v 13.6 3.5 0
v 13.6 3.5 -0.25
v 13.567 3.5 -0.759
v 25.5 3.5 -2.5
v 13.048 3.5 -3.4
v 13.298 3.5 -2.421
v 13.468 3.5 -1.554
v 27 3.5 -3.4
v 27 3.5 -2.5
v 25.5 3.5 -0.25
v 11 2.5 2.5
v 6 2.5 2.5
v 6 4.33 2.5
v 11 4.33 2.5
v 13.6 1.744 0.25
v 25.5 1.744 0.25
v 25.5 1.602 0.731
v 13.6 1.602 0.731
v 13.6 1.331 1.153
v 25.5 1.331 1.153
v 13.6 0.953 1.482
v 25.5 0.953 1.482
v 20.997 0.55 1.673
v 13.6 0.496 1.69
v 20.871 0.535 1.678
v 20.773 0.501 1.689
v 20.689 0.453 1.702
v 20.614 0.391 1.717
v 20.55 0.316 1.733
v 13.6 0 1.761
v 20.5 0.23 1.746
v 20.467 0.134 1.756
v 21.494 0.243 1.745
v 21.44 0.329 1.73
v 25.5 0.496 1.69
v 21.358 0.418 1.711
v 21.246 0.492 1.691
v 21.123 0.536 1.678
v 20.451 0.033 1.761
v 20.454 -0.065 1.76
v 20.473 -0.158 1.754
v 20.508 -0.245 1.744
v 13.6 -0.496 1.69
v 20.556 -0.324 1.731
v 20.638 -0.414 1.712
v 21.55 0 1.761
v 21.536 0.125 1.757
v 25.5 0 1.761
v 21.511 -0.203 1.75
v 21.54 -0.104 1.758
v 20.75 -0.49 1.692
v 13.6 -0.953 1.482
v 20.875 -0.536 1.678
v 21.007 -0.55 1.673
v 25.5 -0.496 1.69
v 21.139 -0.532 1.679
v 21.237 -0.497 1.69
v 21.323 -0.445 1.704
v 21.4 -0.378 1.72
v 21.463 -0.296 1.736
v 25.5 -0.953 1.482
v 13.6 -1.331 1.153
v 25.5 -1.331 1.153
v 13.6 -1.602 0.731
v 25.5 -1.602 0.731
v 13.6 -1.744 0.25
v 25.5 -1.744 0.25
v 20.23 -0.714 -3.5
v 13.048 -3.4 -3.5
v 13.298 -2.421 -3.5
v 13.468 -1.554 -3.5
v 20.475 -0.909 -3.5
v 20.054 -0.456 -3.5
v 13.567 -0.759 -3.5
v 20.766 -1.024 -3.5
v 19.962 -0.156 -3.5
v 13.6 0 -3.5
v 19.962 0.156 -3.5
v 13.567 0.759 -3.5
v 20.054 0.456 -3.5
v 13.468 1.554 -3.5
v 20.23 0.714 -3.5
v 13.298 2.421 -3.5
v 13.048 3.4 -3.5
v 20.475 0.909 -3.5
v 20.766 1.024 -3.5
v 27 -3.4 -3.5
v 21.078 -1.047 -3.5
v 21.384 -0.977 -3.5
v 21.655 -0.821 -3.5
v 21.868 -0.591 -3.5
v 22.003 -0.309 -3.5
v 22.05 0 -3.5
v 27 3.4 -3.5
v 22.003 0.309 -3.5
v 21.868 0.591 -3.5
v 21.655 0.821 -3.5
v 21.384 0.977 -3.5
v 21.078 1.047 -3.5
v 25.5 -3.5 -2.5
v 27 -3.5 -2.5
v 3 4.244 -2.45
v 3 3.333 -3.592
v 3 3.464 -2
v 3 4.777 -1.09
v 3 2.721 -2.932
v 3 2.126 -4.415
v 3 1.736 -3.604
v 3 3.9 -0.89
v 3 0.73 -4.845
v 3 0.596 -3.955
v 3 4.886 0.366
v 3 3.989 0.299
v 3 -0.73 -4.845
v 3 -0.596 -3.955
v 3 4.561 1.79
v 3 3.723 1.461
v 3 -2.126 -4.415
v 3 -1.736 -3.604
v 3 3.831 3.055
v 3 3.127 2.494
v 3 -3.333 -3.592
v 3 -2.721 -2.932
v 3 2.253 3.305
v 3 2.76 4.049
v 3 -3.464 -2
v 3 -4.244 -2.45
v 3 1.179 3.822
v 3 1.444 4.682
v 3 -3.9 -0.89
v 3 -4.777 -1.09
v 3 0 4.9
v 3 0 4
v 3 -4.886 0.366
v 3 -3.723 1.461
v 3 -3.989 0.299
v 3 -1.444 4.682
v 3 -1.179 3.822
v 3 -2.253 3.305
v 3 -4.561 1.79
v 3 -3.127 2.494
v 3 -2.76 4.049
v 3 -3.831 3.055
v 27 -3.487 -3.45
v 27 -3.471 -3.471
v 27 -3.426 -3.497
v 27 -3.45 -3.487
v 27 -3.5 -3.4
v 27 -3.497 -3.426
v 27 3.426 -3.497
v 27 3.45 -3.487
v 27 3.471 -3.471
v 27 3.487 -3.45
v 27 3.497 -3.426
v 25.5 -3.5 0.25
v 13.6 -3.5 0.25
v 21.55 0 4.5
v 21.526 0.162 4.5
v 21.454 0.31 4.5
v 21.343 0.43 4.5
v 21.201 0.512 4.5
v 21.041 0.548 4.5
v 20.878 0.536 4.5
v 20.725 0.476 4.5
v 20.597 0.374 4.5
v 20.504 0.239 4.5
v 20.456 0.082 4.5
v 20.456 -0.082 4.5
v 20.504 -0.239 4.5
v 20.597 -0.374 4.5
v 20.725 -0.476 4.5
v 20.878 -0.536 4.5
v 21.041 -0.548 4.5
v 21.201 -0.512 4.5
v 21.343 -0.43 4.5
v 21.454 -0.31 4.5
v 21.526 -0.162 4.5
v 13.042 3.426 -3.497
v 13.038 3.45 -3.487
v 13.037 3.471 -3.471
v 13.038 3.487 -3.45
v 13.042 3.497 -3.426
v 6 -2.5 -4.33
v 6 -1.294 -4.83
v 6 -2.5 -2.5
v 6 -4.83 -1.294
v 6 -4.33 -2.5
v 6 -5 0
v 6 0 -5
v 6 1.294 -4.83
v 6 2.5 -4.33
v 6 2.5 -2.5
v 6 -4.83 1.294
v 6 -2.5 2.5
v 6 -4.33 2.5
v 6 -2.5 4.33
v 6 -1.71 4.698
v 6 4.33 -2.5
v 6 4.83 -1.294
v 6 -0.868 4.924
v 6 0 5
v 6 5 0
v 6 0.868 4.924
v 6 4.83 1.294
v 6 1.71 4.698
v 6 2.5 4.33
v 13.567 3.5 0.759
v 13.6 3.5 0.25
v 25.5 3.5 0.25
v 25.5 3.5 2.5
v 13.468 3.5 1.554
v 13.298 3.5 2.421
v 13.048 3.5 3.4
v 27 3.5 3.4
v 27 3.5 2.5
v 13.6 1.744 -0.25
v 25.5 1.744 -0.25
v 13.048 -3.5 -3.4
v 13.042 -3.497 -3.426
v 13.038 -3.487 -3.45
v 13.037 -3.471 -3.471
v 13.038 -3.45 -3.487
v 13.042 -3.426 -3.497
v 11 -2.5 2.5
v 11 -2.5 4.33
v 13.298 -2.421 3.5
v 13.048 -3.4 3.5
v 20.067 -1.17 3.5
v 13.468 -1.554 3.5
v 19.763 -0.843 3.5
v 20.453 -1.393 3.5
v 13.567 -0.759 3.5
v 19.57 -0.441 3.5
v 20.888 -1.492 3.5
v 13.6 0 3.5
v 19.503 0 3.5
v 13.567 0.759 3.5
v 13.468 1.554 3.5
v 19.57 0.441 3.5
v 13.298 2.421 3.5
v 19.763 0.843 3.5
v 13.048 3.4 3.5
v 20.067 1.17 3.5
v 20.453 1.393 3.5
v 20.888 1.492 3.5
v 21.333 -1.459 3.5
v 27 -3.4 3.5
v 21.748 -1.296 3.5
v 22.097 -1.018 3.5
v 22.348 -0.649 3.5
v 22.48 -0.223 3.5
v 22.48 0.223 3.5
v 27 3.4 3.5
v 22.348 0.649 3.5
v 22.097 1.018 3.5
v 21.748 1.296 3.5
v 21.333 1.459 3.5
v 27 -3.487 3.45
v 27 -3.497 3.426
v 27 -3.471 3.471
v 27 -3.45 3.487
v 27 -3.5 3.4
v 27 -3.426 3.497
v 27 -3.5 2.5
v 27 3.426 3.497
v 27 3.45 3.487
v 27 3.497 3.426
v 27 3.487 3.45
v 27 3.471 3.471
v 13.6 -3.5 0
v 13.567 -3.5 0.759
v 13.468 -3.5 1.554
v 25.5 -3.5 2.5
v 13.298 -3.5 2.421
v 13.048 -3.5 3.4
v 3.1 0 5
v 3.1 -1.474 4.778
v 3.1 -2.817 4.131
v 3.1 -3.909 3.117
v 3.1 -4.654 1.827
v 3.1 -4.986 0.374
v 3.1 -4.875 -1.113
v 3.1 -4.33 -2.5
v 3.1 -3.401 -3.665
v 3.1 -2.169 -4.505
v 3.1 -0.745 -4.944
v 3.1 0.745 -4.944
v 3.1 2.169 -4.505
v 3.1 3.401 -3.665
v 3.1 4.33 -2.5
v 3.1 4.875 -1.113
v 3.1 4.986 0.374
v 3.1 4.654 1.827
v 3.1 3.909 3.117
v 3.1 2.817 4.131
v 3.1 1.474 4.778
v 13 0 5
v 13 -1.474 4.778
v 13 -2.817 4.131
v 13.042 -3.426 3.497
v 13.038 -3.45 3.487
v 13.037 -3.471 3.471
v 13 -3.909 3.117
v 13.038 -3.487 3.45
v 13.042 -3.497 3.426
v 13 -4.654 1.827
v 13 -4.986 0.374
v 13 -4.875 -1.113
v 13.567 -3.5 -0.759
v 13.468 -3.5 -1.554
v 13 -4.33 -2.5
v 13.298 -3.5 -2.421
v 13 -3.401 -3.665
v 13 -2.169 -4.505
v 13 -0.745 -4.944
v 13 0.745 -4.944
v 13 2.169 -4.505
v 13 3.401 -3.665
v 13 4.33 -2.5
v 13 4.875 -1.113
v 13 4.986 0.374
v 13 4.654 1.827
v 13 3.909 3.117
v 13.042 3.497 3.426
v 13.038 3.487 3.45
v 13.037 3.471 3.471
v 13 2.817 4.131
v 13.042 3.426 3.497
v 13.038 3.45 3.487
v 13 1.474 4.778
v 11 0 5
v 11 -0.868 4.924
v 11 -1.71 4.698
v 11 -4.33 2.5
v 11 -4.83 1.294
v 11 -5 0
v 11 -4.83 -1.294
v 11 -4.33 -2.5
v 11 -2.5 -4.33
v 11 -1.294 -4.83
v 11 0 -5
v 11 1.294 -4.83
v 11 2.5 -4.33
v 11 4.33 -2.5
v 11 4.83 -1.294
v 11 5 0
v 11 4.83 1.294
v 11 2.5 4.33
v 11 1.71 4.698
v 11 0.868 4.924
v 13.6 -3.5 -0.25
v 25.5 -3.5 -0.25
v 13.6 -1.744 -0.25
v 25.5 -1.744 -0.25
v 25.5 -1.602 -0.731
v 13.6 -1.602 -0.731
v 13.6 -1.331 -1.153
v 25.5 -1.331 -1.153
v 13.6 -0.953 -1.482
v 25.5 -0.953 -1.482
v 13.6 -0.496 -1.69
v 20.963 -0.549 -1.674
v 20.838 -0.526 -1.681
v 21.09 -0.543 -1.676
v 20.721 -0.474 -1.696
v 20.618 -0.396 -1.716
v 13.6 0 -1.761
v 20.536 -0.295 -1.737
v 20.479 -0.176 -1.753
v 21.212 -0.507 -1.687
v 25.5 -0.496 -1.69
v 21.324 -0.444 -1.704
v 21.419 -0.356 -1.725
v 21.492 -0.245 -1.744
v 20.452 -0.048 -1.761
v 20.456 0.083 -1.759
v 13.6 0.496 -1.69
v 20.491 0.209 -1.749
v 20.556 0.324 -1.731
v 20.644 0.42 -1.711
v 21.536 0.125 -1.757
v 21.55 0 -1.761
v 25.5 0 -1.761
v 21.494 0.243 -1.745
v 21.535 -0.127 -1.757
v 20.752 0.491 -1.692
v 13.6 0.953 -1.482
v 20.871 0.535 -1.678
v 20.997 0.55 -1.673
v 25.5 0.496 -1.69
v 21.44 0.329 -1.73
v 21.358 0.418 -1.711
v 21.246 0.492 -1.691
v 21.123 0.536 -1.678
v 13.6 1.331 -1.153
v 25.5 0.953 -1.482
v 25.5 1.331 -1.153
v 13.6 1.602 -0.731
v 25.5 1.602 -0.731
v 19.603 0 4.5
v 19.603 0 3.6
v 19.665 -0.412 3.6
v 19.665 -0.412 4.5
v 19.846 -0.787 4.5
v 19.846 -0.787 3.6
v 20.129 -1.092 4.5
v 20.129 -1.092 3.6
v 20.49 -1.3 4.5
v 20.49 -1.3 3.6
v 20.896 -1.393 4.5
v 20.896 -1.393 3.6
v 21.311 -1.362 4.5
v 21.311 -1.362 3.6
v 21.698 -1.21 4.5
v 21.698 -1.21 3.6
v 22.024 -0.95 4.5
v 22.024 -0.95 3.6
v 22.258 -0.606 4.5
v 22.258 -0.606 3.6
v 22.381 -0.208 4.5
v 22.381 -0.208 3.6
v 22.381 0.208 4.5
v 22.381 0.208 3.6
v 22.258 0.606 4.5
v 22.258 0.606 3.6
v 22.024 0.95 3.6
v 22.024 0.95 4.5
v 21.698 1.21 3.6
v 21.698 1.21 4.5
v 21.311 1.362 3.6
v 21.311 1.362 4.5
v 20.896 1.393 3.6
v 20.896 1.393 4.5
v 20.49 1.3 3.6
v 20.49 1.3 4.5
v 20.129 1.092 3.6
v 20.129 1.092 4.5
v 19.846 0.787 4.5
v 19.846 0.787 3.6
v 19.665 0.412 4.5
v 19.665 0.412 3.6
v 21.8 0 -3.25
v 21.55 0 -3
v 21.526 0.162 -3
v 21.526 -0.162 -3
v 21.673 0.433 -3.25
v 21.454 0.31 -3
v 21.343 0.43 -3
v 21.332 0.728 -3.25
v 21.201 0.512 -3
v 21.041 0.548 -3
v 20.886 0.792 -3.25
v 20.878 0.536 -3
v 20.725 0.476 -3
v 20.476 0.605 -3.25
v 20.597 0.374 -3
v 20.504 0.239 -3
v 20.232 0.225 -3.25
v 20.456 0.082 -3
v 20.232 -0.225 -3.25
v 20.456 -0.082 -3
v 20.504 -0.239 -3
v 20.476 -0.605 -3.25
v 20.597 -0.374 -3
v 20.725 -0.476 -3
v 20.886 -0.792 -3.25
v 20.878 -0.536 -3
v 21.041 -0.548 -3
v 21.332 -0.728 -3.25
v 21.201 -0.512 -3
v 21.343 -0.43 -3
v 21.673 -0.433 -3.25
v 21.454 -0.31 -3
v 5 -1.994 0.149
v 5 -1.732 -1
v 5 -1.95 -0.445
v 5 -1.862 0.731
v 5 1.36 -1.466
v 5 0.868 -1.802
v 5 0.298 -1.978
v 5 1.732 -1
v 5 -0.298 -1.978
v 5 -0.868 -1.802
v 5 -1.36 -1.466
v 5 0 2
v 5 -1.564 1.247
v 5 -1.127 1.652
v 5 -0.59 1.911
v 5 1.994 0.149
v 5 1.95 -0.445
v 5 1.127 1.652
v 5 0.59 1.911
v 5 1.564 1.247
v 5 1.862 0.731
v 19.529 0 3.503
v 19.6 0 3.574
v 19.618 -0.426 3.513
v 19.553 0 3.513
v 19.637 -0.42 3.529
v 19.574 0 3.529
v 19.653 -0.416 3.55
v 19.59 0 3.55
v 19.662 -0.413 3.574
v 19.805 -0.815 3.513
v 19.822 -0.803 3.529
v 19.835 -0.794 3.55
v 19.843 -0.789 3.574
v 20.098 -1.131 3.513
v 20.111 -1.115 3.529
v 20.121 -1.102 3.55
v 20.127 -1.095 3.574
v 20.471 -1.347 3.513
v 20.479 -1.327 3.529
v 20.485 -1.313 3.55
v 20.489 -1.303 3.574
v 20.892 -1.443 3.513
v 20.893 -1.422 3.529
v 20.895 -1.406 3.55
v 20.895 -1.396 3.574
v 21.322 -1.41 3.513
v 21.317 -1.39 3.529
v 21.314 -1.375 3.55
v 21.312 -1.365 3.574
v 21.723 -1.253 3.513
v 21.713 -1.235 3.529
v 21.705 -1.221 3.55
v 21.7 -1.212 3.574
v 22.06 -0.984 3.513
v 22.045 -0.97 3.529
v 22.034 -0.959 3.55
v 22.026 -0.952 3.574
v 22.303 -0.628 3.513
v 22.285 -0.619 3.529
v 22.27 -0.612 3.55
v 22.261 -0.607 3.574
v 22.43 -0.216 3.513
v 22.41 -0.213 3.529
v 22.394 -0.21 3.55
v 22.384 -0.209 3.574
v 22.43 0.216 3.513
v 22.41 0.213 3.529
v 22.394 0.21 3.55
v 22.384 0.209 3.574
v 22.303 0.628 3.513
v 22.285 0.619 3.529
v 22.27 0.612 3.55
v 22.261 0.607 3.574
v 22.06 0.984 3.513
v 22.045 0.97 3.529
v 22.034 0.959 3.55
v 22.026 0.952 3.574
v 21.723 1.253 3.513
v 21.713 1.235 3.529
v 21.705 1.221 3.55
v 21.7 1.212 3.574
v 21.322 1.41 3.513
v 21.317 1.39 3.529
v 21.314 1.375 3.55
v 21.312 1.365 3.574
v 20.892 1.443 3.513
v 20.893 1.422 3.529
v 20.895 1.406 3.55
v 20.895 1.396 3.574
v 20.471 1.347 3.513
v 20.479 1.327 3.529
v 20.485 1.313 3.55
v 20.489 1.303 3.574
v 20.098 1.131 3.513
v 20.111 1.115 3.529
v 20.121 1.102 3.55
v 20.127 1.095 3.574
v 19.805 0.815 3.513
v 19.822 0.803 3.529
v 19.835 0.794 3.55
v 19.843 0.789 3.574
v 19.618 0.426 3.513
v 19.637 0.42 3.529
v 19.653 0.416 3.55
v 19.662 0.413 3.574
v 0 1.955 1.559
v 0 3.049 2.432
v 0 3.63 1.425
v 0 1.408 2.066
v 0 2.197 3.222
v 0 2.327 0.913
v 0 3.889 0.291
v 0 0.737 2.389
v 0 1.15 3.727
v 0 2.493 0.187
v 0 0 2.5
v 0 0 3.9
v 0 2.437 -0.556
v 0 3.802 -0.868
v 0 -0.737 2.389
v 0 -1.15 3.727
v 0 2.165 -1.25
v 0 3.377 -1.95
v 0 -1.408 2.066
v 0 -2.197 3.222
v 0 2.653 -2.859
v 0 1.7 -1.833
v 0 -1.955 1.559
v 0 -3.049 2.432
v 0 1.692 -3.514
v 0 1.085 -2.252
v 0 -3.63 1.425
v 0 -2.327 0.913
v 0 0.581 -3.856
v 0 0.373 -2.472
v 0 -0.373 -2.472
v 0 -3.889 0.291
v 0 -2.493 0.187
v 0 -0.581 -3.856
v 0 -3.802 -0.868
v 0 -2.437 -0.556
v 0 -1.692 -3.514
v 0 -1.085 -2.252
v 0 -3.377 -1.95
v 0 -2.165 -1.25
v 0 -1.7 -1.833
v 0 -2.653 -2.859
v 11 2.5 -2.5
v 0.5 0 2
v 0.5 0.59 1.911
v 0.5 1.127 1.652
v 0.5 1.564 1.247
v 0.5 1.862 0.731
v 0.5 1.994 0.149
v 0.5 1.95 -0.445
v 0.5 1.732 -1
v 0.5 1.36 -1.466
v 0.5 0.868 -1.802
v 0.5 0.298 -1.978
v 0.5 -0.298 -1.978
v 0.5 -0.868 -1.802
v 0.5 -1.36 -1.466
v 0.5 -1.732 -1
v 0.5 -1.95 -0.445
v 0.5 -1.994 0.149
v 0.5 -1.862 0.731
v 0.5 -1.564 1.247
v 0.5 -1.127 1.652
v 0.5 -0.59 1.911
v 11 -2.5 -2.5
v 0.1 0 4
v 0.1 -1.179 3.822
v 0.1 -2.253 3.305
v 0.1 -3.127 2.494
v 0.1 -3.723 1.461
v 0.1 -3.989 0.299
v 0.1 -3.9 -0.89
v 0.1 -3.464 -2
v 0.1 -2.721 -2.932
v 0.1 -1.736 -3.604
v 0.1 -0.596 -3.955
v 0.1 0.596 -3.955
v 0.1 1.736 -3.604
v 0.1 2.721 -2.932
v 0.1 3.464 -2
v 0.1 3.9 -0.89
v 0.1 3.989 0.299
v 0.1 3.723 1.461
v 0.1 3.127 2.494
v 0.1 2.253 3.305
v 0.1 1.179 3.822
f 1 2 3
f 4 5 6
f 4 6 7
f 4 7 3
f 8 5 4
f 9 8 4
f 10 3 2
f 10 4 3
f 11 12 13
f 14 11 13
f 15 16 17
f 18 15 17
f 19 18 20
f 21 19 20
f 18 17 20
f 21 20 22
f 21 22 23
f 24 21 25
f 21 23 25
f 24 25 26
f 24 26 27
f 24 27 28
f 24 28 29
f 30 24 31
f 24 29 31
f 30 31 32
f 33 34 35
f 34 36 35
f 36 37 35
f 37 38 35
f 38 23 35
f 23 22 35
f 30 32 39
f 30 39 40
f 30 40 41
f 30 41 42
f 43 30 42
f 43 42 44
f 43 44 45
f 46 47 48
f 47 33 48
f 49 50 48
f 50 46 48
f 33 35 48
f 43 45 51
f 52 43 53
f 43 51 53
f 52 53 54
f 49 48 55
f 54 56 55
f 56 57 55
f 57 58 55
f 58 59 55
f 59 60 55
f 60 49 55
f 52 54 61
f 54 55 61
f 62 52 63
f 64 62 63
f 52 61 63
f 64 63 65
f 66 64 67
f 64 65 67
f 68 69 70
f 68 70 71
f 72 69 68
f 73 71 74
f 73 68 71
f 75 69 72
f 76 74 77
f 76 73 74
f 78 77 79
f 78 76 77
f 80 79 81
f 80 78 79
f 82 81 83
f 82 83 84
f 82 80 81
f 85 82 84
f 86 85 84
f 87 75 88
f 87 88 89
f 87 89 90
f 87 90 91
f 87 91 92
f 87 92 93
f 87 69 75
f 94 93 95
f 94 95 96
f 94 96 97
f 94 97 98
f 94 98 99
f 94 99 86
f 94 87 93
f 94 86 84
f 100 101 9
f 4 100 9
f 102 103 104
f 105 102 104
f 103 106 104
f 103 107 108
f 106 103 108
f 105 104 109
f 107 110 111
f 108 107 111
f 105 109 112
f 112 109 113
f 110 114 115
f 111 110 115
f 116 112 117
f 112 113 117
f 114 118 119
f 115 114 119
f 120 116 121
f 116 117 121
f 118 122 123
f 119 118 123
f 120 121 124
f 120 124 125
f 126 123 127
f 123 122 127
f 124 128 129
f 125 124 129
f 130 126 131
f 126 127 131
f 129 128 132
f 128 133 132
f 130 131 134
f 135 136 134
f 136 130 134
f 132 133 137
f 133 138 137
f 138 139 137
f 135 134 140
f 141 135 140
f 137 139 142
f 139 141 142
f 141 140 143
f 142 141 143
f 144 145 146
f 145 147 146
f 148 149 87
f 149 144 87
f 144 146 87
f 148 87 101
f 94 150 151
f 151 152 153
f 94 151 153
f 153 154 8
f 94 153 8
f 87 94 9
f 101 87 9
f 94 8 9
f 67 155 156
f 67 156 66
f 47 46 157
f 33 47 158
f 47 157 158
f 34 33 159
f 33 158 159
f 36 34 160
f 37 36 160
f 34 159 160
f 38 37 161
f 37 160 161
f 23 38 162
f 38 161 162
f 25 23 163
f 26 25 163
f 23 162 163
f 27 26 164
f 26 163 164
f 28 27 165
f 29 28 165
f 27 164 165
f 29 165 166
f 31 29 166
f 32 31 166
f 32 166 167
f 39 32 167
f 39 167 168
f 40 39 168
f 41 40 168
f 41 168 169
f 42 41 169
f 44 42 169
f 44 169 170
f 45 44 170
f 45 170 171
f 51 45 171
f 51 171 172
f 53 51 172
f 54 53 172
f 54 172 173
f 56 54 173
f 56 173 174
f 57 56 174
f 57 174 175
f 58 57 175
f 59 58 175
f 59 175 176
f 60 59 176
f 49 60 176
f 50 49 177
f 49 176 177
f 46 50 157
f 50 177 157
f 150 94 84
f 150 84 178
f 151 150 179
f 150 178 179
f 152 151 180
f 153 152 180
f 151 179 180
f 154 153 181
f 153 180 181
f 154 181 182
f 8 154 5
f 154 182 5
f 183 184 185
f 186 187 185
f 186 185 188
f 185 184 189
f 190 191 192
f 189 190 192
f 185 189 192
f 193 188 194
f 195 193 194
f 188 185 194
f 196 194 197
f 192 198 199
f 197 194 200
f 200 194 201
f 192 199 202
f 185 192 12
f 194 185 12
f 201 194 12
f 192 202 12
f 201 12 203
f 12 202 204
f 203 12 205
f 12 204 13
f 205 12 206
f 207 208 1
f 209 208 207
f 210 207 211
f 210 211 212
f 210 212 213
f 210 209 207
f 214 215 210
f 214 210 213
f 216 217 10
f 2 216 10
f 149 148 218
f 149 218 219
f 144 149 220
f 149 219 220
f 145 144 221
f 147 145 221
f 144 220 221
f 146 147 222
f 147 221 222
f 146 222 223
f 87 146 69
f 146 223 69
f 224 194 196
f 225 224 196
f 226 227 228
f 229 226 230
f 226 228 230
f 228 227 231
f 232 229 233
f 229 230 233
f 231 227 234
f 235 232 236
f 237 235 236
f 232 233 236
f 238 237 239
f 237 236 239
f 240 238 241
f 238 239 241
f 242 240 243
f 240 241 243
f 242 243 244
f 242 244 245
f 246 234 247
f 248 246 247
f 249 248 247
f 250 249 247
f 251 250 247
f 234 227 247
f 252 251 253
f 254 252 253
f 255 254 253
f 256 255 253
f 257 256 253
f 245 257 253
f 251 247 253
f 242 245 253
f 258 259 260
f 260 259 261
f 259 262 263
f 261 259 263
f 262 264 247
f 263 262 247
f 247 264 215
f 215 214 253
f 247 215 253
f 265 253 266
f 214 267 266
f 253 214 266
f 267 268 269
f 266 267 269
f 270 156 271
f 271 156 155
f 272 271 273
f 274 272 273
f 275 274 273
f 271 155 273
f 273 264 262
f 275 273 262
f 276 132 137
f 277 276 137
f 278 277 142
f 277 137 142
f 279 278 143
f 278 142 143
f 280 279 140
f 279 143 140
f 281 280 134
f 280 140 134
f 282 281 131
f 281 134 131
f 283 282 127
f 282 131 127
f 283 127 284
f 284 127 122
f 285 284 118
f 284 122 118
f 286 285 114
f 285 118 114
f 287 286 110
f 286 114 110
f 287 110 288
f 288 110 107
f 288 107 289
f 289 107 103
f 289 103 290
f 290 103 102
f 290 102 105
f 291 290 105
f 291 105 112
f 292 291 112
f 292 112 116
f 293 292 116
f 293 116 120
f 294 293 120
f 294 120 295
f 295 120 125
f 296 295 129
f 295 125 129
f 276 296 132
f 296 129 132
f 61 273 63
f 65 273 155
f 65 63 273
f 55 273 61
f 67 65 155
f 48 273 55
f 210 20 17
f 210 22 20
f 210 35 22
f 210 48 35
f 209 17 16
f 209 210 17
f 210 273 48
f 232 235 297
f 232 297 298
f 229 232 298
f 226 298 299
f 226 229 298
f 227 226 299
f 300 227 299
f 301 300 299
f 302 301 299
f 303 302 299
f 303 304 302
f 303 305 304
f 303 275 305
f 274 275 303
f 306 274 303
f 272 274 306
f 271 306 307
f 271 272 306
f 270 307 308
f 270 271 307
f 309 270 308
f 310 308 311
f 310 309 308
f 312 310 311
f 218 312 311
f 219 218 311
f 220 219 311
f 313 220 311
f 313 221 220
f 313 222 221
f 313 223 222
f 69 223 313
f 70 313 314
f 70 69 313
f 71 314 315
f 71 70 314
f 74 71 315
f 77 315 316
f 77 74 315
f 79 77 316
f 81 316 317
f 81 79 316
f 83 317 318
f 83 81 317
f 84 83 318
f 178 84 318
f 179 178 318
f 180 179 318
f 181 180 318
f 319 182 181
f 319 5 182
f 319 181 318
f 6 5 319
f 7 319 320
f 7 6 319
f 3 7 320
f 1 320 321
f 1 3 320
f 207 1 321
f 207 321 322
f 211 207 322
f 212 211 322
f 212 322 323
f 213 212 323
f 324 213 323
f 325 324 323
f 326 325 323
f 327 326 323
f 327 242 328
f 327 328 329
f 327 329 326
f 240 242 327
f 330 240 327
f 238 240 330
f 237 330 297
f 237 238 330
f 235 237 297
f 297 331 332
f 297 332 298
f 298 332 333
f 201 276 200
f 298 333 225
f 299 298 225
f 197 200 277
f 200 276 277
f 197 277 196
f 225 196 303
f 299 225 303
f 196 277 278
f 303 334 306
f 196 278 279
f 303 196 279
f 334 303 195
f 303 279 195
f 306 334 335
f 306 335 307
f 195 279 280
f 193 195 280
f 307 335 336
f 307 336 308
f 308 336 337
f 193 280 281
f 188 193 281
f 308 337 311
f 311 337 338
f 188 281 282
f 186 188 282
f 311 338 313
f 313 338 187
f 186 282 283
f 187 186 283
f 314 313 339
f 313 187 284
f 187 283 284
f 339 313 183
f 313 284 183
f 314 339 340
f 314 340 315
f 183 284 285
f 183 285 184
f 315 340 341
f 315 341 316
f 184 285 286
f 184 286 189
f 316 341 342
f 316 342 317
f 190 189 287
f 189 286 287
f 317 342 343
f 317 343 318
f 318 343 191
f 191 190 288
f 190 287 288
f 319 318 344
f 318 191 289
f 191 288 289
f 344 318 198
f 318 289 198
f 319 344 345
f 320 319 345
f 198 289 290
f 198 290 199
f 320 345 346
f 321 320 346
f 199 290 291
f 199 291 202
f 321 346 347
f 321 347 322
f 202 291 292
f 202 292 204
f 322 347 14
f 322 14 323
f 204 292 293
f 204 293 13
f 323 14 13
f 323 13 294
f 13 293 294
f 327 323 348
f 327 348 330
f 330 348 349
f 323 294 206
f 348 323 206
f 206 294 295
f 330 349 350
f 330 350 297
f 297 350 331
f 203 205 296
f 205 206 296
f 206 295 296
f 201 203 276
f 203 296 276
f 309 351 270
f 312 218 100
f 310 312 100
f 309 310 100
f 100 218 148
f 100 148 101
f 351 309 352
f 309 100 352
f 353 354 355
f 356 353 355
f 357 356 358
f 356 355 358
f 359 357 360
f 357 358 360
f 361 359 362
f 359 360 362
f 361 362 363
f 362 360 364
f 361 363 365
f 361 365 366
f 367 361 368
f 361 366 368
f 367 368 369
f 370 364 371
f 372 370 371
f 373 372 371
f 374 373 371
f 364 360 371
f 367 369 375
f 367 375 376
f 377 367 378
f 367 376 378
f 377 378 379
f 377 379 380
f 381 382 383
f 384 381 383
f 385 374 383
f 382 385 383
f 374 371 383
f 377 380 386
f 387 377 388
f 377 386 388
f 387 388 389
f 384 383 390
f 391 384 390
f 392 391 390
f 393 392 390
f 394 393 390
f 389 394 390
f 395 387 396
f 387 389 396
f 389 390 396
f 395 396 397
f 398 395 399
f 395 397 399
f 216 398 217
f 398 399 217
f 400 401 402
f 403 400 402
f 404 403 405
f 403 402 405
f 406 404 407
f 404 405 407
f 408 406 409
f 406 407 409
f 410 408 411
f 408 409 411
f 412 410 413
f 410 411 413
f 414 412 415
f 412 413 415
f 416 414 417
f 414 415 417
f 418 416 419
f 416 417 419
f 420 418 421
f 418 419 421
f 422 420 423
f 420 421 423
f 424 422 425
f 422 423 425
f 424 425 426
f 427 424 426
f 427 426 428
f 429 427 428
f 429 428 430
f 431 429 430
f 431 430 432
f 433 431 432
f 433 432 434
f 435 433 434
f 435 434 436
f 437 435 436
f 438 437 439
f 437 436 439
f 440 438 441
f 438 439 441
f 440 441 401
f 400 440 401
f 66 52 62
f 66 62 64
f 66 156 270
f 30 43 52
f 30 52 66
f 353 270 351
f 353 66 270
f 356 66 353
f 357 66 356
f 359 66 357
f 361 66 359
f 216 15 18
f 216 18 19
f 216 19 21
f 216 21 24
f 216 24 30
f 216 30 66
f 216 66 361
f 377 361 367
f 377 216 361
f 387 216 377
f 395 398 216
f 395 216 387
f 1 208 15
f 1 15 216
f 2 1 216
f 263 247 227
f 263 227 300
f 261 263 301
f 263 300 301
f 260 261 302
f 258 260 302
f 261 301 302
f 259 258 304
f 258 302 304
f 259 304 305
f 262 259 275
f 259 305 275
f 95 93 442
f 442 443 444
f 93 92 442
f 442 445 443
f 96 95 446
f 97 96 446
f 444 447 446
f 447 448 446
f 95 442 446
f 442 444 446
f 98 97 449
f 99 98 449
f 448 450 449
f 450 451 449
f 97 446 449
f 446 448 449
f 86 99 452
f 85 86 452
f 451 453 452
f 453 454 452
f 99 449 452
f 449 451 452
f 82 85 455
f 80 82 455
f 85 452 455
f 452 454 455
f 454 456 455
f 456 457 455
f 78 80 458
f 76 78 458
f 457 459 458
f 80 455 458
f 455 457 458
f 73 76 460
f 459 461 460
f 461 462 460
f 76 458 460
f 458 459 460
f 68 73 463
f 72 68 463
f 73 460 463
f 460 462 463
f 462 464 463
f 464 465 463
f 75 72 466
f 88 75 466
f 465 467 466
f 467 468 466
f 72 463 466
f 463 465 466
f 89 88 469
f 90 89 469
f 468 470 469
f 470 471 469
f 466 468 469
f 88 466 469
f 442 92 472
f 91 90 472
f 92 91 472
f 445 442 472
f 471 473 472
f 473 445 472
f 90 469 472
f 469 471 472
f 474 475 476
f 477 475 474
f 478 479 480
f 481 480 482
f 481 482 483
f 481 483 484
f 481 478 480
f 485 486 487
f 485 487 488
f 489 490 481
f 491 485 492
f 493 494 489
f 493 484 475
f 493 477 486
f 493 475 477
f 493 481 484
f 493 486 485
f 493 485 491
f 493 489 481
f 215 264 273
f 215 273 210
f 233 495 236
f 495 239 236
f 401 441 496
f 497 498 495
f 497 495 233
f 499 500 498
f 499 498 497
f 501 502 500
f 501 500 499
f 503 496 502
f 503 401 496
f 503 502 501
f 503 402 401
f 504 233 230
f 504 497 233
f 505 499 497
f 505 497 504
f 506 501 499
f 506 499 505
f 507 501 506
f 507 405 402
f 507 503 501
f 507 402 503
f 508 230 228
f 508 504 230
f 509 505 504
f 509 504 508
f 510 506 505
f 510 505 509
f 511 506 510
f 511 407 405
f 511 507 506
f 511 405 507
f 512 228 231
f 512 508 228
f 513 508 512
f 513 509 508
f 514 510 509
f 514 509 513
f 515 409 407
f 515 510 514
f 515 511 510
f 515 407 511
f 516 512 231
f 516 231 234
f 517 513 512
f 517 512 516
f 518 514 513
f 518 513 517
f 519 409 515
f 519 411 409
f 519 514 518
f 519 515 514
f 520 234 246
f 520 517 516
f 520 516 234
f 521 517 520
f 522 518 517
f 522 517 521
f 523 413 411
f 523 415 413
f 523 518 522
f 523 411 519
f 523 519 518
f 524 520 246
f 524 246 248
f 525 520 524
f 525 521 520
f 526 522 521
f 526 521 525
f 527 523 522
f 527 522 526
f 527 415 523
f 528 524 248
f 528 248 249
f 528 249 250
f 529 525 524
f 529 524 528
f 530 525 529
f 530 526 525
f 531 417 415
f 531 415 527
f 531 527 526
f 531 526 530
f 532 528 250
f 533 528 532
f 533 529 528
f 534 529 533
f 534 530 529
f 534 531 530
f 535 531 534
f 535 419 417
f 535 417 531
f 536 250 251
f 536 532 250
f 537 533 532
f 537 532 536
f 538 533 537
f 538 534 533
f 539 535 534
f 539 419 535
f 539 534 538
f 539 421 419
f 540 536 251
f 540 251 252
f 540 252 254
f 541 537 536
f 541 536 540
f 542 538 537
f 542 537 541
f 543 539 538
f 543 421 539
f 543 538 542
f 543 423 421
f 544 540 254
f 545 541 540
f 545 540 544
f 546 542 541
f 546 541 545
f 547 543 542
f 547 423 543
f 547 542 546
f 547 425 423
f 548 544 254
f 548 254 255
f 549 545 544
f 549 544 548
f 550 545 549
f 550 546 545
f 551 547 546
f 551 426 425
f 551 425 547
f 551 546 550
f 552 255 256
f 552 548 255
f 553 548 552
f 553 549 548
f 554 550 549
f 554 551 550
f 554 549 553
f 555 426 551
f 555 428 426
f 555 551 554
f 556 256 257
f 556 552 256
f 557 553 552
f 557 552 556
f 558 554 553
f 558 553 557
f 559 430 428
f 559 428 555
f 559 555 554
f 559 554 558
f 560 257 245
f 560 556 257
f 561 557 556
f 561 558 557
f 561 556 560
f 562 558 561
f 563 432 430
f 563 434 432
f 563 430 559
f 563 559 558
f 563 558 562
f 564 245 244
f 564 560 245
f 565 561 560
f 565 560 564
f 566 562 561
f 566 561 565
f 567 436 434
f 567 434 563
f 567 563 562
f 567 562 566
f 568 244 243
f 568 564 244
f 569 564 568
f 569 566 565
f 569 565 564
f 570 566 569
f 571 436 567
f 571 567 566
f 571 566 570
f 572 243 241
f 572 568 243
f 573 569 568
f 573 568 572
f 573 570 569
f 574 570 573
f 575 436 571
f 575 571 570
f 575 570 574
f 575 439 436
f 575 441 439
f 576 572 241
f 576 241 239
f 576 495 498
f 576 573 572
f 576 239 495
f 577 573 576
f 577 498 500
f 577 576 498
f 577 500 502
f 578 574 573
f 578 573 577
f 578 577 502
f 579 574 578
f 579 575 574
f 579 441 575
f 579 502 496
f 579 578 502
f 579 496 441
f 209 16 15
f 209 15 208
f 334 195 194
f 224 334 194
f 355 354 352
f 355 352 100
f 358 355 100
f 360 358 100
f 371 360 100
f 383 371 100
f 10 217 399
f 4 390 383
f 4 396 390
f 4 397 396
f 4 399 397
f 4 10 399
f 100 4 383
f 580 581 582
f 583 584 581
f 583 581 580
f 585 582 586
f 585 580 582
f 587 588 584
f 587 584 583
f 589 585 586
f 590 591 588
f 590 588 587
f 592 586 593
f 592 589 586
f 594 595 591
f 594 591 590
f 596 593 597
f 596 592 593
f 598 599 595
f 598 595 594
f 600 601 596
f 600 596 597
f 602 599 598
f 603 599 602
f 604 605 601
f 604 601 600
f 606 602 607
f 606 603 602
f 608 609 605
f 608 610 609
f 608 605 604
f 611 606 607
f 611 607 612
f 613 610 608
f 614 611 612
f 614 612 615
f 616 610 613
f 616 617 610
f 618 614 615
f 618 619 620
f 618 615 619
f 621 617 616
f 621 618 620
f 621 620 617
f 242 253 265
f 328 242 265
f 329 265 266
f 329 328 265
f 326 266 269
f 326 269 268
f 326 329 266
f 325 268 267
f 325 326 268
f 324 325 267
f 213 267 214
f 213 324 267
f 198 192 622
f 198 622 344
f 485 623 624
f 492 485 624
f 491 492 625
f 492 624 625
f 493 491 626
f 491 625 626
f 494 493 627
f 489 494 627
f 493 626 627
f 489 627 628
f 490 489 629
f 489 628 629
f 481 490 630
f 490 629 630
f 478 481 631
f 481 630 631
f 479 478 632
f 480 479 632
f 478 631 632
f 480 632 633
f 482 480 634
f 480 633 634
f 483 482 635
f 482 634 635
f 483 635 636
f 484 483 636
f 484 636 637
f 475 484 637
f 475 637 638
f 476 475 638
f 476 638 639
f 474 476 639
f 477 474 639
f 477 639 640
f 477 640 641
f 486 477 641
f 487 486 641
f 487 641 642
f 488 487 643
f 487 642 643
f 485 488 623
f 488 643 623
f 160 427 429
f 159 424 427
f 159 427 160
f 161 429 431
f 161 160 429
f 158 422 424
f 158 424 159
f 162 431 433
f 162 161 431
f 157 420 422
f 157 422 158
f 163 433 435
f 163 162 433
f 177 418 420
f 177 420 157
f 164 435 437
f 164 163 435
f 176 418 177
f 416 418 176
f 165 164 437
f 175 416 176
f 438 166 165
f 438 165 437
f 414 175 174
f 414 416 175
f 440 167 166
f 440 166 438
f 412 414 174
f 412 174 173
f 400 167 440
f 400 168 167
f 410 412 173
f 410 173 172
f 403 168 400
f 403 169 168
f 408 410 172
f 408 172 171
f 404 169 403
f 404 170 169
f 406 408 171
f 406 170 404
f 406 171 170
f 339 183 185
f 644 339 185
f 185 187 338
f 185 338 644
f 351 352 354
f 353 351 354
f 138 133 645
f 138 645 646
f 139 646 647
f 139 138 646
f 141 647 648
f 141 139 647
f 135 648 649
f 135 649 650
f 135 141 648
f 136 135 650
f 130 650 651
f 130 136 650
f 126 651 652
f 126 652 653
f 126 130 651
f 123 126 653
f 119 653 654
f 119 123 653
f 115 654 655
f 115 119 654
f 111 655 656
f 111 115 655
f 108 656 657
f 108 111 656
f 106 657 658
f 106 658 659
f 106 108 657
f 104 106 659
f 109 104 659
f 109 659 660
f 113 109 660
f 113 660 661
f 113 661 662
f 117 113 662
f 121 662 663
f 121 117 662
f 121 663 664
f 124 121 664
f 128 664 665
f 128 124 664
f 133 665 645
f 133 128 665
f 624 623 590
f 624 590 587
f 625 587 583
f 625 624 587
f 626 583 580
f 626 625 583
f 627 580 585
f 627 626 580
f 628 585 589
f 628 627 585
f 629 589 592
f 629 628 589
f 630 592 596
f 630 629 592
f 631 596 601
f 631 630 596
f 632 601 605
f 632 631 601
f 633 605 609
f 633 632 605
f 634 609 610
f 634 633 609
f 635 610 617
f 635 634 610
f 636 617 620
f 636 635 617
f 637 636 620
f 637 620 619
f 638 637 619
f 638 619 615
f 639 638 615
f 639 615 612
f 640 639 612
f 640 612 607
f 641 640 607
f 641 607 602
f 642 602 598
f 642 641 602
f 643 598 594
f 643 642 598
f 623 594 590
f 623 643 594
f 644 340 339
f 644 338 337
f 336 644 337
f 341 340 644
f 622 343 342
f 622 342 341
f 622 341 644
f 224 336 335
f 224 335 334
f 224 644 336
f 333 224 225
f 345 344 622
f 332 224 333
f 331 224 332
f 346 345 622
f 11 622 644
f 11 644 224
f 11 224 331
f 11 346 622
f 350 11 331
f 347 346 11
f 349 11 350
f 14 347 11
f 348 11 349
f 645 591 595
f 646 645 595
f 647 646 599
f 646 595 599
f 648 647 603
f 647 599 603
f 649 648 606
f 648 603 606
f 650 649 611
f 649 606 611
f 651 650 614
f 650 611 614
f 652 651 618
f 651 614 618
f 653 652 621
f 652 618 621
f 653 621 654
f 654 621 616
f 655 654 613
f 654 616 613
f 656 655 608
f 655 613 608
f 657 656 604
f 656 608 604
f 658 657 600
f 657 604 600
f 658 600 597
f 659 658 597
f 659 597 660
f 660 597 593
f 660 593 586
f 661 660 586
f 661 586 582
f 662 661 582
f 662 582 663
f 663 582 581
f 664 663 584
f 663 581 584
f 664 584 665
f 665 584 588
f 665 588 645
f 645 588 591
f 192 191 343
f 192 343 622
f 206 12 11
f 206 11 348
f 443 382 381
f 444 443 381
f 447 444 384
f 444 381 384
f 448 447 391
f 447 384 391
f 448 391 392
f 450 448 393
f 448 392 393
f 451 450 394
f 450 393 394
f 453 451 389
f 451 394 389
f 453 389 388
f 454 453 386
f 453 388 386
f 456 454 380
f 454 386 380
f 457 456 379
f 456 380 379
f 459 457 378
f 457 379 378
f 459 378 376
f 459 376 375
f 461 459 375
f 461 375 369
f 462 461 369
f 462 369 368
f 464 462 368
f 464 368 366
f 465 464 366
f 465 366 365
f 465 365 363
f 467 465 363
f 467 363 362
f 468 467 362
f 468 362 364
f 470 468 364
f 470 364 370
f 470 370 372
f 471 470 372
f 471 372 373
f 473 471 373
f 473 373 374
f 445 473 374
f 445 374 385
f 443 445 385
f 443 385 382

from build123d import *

# Parameters (mm, degrees)
SKETCH_1_W          = 3
SKETCH_1_H          = 4
SKETCH_2_W          = 8.891252249
SKETCH_2_H          = 5
SKETCH_2_W_2        = 5
SKETCH_2_H_2        = 11.708042321
CUT_EXTRUDE_1_DEPTH = 5
EXTRUDE_1_REACH     = 29.911
SKETCH_3_W          = 7
SKETCH_3_H          = 7
SKETCH_4_W          = 5
SKETCH_4_H          = 7
CUT_EXTRUDE_2_DEPTH = 1.5
SKETCH_5_R          = 1.761378247
SKETCH_5_W          = 0.5
SKETCH_5_H          = 7
CUT_EXTRUDE_3_DEPTH = 11.9
SKETCH_6_R          = 1.396648932
EXTRUDE_2_DEPTH     = 1
SKETCH_7_R          = 0.55
CUT_EXTRUDE_4_DEPTH = 30.055980452
CHAMFER_1_SIZE      = 0.5
FILLET_1_R          = 0.1
CHAMFER_2_SIZE      = 0.1
FILLET_2_R          = 0.1
SKETCH_8_R          = 2
CUT_EXTRUDE_5_DEPTH = 5
CHAMFER_3_SIZE      = 0.5


with BuildPart() as part:
    # 草图1 → 旋转1 (revolve)
    with BuildSketch(Plane.XY, mode=Mode.PRIVATE) as revolve_1_sk:
        with Locations((1.5, 2)):
            Rectangle(SKETCH_1_W, SKETCH_1_H)
        Polygon((3, 0), (13, 0), (13, 5), (3, 5), (3, 4), align=None)
        Polygon((13, 0), (13, 5), (15, 0), align=None)
    revolve(revolve_1_sk.sketch.rotate(Axis((3, 0, 0), (1, 0, 0)), 90), axis=Axis((3, 0, 0), (1, 0, 0)))

    # 草图2 → 切除-拉伸1 (cut)
    with BuildSketch(Plane.ZY.offset(-6)):
        with Locations((6.945626125, 0)):
            Rectangle(SKETCH_2_W, SKETCH_2_H)
        with Locations((0, -8.354021161)):
            Rectangle(SKETCH_2_W_2, SKETCH_2_H_2)
        with Locations((0, 8.354021161)):
            Rectangle(SKETCH_2_W_2, SKETCH_2_H_2)
        with Locations((-6.945626125, 0)):
            Rectangle(SKETCH_2_W, SKETCH_2_H)
        Rectangle(SKETCH_2_W_2, SKETCH_2_H)
    extrude(amount=-CUT_EXTRUDE_1_DEPTH, mode=Mode.SUBTRACT)

    # 凸台-拉伸1: up to this cone (the profile starts outside it)
    extrude_1_end = Plane(origin=(27, 0, 0), z_dir=(-1, 0, 0)).offset(12.000001) * Cone(2.5e-06, 46.0275, 18.410999, align=(Align.CENTER, Align.CENTER, Align.MIN), mode=Mode.PRIVATE)
    # 草图3 → 凸台-拉伸1 (add, up to the surface)
    with BuildSketch(Plane.ZY.offset(-27), mode=Mode.PRIVATE) as extrude_1_sk1:
        Rectangle(SKETCH_3_W, SKETCH_3_H)
    extrude_1_tool1 = extrude(extrude_1_sk1.sketch, amount=EXTRUDE_1_REACH, mode=Mode.PRIVATE) - extrude_1_end
    add(extrude_1_tool1.solids().sort_by_distance((27, 0, 0))[0])

    # 草图4 → 切除-拉伸2 (cut)
    with BuildSketch(Plane(origin=(27, 0, 0), x_dir=(0, 0, -1), z_dir=(1, 0, 0))):
        Rectangle(SKETCH_4_W, SKETCH_4_H)
    extrude(amount=-CUT_EXTRUDE_2_DEPTH, mode=Mode.SUBTRACT)

    # 草图5 → 切除-拉伸3 (cut)
    with BuildSketch(Plane(origin=(25.5, 0, 0), x_dir=(0, 0, -1), z_dir=(1, 0, 0))):
        Circle(SKETCH_5_R)
        Rectangle(SKETCH_5_W, SKETCH_5_H)
    extrude(amount=-CUT_EXTRUDE_3_DEPTH, mode=Mode.SUBTRACT)

    # 草图6 → 凸台-拉伸2 (add)
    with BuildSketch(Plane.XY.offset(3.5)):
        with Locations(Location((21, 0, 0), (0, 0, 180))):
            Circle(SKETCH_6_R)
    extrude(amount=EXTRUDE_2_DEPTH)

    # 草图7 → 切除-拉伸4 (cut, through all)
    with BuildSketch(Plane.XY.offset(4.5)):
        with Locations((21, 0)):
            Circle(SKETCH_7_R)
    extrude(amount=-CUT_EXTRUDE_4_DEPTH, mode=Mode.SUBTRACT)

    # 倒角1
    chamfer_1_edges = [part.edges().sort_by_distance(p)[0] for p in [
        (20.45, 0, -3.5),
    ]]
    chamfer(chamfer_1_edges, length=CHAMFER_1_SIZE)

    # 圆角1
    fillet_1_edges = [part.edges().sort_by_distance(p)[0] for p in [
        (22.396648932, 0, 3.5),
    ]]
    fillet(fillet_1_edges, radius=FILLET_1_R)

    # 倒角2
    chamfer_2_edges = [part.edges().sort_by_distance(p)[0] for p in [
        (0, 0, -4),
        (3, 0, -5),
    ]]
    chamfer(chamfer_2_edges, length=CHAMFER_2_SIZE)

    # 圆角2
    fillet_2_edges = [part.edges().sort_by_distance(p)[0] for p in [
        (20.010050506, -3.5, -3.5),
        (20.010050506, 3.5, -3.5),
        (20.010050506, 3.5, 3.5),
        (20.010050506, -3.5, 3.5),
    ]]
    fillet(fillet_2_edges, radius=FILLET_2_R)

    # 草图8 → 切除-拉伸5 (cut)
    with BuildSketch(Plane.ZY):
        Circle(SKETCH_8_R)
    extrude(amount=-CUT_EXTRUDE_5_DEPTH, mode=Mode.SUBTRACT)

    # 倒角3
    chamfer_3_edges = [part.edges().sort_by_distance(p)[0] for p in [
        (0, 0, -2),
    ]]
    chamfer(chamfer_3_edges, length=CHAMFER_3_SIZE)


solid = part.part
